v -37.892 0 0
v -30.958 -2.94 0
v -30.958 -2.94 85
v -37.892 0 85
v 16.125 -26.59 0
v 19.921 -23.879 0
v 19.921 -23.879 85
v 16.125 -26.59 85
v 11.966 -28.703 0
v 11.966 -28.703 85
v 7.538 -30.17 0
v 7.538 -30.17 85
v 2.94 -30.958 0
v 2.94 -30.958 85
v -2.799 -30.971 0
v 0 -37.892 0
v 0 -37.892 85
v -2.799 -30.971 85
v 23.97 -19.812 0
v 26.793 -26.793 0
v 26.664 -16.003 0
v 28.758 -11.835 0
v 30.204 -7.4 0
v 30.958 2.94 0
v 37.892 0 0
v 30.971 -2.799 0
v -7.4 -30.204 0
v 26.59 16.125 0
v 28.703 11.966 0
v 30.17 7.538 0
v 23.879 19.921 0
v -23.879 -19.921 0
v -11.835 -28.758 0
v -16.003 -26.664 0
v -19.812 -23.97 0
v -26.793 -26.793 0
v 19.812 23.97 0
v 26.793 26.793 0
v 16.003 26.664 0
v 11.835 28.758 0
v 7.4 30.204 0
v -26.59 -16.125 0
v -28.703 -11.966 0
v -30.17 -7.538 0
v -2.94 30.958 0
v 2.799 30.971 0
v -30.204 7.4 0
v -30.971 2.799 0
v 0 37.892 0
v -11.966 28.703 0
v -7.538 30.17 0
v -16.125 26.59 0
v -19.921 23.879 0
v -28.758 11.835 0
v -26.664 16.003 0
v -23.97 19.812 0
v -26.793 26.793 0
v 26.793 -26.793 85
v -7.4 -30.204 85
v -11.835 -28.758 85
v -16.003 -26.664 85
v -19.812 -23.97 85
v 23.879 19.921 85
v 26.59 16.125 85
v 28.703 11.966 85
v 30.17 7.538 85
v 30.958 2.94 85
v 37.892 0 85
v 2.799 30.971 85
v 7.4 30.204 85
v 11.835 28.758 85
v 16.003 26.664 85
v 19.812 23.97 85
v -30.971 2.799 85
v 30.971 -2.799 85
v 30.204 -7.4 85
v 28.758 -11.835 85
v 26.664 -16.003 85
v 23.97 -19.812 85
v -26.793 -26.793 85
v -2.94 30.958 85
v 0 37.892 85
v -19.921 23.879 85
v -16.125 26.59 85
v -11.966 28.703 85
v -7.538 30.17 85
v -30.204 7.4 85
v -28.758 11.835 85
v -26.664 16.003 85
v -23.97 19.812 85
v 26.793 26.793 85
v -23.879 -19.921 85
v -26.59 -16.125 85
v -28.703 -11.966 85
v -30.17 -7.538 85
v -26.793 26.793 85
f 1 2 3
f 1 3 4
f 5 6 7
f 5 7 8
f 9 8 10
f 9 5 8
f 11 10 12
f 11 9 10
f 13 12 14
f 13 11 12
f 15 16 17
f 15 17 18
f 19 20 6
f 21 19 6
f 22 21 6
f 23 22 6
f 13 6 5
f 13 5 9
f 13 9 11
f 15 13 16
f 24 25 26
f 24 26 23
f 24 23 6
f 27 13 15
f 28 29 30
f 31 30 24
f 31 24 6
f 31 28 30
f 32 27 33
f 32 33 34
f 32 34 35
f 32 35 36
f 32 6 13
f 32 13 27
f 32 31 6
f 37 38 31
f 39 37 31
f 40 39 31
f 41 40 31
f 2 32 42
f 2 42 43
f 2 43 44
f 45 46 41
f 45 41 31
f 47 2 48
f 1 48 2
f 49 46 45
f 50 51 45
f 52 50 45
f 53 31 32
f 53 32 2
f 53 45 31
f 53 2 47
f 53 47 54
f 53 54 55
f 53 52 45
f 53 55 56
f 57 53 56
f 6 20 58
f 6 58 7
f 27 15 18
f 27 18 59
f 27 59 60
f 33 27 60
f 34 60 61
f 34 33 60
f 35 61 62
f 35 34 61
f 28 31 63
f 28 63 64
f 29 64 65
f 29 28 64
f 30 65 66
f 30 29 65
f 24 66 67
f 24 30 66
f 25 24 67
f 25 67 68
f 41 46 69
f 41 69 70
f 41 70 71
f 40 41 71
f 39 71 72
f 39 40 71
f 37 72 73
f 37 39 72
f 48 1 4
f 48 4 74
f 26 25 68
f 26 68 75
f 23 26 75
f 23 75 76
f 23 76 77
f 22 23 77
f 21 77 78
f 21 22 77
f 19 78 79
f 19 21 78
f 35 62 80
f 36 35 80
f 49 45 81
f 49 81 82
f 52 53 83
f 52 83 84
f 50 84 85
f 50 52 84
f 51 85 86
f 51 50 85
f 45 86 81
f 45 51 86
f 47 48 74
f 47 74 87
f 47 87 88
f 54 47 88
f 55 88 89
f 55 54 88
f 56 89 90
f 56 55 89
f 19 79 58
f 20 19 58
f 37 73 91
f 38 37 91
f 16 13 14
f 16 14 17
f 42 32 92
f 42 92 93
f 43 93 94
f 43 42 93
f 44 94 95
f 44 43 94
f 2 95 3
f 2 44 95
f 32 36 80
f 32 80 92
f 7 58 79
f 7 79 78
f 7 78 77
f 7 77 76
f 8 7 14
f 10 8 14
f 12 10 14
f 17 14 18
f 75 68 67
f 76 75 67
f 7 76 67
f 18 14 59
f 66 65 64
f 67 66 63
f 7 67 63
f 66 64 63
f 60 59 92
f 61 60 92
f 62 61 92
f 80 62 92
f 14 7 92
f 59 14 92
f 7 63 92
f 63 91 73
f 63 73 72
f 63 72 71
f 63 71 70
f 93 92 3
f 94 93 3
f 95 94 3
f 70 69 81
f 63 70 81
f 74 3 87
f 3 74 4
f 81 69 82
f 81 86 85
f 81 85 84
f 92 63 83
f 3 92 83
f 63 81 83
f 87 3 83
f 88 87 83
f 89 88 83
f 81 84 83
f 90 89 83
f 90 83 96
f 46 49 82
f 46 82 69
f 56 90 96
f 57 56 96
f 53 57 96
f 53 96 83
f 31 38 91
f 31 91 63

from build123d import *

# Parameters (mm, degrees)
SALIENTE_EXTRUIR1_DEPTH = 85


with BuildPart() as part:
    # Croquis1 → Saliente-Extruir1 (new body)
    with BuildSketch(Plane.XY):
        with BuildLine():
            Line((-2.940383589, 30.958198867), (0, 37.891714368))
            Line((0, 37.891714368), (2.798692732, 30.971329512))
            ThreePointArc((2.798692732, 30.971329512), (11.834742576, 28.757517294), (19.811587178, 23.969917527))
            Line((19.811587178, 23.969917527), (26.79348818, 26.79348818))
            Line((26.79348818, 26.79348818), (23.879011729, 19.921062511))
            ThreePointArc((23.879011729, 19.921062511), (28.703062218, 11.96620876), (30.958198867, 2.940383589))
            Line((30.958198867, 2.940383589), (37.891714368, 0))
            Line((37.891714368, 0), (30.971329512, -2.798692732))
            ThreePointArc((30.971329512, -2.798692732), (28.757517294, -11.834742576), (23.969917527, -19.811587178))
            Line((23.969917527, -19.811587178), (26.79348818, -26.79348818))
            Line((26.79348818, -26.79348818), (19.921062511, -23.879011729))
            ThreePointArc((19.921062511, -23.879011729), (11.96620876, -28.703062218), (2.940383589, -30.958198867))
            Line((2.940383589, -30.958198867), (0, -37.891714368))
            Line((0, -37.891714368), (-2.798692732, -30.971329512))
            ThreePointArc((-2.798692732, -30.971329512), (-11.834742576, -28.757517294), (-19.811587178, -23.969917527))
            Line((-19.811587178, -23.969917527), (-26.79348818, -26.79348818))
            Line((-26.79348818, -26.79348818), (-23.879011729, -19.921062511))
            ThreePointArc((-23.879011729, -19.921062511), (-28.703062218, -11.96620876), (-30.958198867, -2.940383589))
            Line((-30.958198867, -2.940383589), (-37.891714368, 0))
            Line((-37.891714368, 0), (-30.971329512, 2.798692732))
            ThreePointArc((-30.971329512, 2.798692732), (-28.757517294, 11.834742576), (-23.969917527, 19.811587178))
            Line((-23.969917527, 19.811587178), (-26.79348818, 26.79348818))
            Line((-26.79348818, 26.79348818), (-19.921062511, 23.879011729))
            ThreePointArc((-19.921062511, 23.879011729), (-11.96620876, 28.703062218), (-2.940383589, 30.958198867))
        make_face()
    extrude(amount=SALIENTE_EXTRUIR1_DEPTH)


solid = part.part
